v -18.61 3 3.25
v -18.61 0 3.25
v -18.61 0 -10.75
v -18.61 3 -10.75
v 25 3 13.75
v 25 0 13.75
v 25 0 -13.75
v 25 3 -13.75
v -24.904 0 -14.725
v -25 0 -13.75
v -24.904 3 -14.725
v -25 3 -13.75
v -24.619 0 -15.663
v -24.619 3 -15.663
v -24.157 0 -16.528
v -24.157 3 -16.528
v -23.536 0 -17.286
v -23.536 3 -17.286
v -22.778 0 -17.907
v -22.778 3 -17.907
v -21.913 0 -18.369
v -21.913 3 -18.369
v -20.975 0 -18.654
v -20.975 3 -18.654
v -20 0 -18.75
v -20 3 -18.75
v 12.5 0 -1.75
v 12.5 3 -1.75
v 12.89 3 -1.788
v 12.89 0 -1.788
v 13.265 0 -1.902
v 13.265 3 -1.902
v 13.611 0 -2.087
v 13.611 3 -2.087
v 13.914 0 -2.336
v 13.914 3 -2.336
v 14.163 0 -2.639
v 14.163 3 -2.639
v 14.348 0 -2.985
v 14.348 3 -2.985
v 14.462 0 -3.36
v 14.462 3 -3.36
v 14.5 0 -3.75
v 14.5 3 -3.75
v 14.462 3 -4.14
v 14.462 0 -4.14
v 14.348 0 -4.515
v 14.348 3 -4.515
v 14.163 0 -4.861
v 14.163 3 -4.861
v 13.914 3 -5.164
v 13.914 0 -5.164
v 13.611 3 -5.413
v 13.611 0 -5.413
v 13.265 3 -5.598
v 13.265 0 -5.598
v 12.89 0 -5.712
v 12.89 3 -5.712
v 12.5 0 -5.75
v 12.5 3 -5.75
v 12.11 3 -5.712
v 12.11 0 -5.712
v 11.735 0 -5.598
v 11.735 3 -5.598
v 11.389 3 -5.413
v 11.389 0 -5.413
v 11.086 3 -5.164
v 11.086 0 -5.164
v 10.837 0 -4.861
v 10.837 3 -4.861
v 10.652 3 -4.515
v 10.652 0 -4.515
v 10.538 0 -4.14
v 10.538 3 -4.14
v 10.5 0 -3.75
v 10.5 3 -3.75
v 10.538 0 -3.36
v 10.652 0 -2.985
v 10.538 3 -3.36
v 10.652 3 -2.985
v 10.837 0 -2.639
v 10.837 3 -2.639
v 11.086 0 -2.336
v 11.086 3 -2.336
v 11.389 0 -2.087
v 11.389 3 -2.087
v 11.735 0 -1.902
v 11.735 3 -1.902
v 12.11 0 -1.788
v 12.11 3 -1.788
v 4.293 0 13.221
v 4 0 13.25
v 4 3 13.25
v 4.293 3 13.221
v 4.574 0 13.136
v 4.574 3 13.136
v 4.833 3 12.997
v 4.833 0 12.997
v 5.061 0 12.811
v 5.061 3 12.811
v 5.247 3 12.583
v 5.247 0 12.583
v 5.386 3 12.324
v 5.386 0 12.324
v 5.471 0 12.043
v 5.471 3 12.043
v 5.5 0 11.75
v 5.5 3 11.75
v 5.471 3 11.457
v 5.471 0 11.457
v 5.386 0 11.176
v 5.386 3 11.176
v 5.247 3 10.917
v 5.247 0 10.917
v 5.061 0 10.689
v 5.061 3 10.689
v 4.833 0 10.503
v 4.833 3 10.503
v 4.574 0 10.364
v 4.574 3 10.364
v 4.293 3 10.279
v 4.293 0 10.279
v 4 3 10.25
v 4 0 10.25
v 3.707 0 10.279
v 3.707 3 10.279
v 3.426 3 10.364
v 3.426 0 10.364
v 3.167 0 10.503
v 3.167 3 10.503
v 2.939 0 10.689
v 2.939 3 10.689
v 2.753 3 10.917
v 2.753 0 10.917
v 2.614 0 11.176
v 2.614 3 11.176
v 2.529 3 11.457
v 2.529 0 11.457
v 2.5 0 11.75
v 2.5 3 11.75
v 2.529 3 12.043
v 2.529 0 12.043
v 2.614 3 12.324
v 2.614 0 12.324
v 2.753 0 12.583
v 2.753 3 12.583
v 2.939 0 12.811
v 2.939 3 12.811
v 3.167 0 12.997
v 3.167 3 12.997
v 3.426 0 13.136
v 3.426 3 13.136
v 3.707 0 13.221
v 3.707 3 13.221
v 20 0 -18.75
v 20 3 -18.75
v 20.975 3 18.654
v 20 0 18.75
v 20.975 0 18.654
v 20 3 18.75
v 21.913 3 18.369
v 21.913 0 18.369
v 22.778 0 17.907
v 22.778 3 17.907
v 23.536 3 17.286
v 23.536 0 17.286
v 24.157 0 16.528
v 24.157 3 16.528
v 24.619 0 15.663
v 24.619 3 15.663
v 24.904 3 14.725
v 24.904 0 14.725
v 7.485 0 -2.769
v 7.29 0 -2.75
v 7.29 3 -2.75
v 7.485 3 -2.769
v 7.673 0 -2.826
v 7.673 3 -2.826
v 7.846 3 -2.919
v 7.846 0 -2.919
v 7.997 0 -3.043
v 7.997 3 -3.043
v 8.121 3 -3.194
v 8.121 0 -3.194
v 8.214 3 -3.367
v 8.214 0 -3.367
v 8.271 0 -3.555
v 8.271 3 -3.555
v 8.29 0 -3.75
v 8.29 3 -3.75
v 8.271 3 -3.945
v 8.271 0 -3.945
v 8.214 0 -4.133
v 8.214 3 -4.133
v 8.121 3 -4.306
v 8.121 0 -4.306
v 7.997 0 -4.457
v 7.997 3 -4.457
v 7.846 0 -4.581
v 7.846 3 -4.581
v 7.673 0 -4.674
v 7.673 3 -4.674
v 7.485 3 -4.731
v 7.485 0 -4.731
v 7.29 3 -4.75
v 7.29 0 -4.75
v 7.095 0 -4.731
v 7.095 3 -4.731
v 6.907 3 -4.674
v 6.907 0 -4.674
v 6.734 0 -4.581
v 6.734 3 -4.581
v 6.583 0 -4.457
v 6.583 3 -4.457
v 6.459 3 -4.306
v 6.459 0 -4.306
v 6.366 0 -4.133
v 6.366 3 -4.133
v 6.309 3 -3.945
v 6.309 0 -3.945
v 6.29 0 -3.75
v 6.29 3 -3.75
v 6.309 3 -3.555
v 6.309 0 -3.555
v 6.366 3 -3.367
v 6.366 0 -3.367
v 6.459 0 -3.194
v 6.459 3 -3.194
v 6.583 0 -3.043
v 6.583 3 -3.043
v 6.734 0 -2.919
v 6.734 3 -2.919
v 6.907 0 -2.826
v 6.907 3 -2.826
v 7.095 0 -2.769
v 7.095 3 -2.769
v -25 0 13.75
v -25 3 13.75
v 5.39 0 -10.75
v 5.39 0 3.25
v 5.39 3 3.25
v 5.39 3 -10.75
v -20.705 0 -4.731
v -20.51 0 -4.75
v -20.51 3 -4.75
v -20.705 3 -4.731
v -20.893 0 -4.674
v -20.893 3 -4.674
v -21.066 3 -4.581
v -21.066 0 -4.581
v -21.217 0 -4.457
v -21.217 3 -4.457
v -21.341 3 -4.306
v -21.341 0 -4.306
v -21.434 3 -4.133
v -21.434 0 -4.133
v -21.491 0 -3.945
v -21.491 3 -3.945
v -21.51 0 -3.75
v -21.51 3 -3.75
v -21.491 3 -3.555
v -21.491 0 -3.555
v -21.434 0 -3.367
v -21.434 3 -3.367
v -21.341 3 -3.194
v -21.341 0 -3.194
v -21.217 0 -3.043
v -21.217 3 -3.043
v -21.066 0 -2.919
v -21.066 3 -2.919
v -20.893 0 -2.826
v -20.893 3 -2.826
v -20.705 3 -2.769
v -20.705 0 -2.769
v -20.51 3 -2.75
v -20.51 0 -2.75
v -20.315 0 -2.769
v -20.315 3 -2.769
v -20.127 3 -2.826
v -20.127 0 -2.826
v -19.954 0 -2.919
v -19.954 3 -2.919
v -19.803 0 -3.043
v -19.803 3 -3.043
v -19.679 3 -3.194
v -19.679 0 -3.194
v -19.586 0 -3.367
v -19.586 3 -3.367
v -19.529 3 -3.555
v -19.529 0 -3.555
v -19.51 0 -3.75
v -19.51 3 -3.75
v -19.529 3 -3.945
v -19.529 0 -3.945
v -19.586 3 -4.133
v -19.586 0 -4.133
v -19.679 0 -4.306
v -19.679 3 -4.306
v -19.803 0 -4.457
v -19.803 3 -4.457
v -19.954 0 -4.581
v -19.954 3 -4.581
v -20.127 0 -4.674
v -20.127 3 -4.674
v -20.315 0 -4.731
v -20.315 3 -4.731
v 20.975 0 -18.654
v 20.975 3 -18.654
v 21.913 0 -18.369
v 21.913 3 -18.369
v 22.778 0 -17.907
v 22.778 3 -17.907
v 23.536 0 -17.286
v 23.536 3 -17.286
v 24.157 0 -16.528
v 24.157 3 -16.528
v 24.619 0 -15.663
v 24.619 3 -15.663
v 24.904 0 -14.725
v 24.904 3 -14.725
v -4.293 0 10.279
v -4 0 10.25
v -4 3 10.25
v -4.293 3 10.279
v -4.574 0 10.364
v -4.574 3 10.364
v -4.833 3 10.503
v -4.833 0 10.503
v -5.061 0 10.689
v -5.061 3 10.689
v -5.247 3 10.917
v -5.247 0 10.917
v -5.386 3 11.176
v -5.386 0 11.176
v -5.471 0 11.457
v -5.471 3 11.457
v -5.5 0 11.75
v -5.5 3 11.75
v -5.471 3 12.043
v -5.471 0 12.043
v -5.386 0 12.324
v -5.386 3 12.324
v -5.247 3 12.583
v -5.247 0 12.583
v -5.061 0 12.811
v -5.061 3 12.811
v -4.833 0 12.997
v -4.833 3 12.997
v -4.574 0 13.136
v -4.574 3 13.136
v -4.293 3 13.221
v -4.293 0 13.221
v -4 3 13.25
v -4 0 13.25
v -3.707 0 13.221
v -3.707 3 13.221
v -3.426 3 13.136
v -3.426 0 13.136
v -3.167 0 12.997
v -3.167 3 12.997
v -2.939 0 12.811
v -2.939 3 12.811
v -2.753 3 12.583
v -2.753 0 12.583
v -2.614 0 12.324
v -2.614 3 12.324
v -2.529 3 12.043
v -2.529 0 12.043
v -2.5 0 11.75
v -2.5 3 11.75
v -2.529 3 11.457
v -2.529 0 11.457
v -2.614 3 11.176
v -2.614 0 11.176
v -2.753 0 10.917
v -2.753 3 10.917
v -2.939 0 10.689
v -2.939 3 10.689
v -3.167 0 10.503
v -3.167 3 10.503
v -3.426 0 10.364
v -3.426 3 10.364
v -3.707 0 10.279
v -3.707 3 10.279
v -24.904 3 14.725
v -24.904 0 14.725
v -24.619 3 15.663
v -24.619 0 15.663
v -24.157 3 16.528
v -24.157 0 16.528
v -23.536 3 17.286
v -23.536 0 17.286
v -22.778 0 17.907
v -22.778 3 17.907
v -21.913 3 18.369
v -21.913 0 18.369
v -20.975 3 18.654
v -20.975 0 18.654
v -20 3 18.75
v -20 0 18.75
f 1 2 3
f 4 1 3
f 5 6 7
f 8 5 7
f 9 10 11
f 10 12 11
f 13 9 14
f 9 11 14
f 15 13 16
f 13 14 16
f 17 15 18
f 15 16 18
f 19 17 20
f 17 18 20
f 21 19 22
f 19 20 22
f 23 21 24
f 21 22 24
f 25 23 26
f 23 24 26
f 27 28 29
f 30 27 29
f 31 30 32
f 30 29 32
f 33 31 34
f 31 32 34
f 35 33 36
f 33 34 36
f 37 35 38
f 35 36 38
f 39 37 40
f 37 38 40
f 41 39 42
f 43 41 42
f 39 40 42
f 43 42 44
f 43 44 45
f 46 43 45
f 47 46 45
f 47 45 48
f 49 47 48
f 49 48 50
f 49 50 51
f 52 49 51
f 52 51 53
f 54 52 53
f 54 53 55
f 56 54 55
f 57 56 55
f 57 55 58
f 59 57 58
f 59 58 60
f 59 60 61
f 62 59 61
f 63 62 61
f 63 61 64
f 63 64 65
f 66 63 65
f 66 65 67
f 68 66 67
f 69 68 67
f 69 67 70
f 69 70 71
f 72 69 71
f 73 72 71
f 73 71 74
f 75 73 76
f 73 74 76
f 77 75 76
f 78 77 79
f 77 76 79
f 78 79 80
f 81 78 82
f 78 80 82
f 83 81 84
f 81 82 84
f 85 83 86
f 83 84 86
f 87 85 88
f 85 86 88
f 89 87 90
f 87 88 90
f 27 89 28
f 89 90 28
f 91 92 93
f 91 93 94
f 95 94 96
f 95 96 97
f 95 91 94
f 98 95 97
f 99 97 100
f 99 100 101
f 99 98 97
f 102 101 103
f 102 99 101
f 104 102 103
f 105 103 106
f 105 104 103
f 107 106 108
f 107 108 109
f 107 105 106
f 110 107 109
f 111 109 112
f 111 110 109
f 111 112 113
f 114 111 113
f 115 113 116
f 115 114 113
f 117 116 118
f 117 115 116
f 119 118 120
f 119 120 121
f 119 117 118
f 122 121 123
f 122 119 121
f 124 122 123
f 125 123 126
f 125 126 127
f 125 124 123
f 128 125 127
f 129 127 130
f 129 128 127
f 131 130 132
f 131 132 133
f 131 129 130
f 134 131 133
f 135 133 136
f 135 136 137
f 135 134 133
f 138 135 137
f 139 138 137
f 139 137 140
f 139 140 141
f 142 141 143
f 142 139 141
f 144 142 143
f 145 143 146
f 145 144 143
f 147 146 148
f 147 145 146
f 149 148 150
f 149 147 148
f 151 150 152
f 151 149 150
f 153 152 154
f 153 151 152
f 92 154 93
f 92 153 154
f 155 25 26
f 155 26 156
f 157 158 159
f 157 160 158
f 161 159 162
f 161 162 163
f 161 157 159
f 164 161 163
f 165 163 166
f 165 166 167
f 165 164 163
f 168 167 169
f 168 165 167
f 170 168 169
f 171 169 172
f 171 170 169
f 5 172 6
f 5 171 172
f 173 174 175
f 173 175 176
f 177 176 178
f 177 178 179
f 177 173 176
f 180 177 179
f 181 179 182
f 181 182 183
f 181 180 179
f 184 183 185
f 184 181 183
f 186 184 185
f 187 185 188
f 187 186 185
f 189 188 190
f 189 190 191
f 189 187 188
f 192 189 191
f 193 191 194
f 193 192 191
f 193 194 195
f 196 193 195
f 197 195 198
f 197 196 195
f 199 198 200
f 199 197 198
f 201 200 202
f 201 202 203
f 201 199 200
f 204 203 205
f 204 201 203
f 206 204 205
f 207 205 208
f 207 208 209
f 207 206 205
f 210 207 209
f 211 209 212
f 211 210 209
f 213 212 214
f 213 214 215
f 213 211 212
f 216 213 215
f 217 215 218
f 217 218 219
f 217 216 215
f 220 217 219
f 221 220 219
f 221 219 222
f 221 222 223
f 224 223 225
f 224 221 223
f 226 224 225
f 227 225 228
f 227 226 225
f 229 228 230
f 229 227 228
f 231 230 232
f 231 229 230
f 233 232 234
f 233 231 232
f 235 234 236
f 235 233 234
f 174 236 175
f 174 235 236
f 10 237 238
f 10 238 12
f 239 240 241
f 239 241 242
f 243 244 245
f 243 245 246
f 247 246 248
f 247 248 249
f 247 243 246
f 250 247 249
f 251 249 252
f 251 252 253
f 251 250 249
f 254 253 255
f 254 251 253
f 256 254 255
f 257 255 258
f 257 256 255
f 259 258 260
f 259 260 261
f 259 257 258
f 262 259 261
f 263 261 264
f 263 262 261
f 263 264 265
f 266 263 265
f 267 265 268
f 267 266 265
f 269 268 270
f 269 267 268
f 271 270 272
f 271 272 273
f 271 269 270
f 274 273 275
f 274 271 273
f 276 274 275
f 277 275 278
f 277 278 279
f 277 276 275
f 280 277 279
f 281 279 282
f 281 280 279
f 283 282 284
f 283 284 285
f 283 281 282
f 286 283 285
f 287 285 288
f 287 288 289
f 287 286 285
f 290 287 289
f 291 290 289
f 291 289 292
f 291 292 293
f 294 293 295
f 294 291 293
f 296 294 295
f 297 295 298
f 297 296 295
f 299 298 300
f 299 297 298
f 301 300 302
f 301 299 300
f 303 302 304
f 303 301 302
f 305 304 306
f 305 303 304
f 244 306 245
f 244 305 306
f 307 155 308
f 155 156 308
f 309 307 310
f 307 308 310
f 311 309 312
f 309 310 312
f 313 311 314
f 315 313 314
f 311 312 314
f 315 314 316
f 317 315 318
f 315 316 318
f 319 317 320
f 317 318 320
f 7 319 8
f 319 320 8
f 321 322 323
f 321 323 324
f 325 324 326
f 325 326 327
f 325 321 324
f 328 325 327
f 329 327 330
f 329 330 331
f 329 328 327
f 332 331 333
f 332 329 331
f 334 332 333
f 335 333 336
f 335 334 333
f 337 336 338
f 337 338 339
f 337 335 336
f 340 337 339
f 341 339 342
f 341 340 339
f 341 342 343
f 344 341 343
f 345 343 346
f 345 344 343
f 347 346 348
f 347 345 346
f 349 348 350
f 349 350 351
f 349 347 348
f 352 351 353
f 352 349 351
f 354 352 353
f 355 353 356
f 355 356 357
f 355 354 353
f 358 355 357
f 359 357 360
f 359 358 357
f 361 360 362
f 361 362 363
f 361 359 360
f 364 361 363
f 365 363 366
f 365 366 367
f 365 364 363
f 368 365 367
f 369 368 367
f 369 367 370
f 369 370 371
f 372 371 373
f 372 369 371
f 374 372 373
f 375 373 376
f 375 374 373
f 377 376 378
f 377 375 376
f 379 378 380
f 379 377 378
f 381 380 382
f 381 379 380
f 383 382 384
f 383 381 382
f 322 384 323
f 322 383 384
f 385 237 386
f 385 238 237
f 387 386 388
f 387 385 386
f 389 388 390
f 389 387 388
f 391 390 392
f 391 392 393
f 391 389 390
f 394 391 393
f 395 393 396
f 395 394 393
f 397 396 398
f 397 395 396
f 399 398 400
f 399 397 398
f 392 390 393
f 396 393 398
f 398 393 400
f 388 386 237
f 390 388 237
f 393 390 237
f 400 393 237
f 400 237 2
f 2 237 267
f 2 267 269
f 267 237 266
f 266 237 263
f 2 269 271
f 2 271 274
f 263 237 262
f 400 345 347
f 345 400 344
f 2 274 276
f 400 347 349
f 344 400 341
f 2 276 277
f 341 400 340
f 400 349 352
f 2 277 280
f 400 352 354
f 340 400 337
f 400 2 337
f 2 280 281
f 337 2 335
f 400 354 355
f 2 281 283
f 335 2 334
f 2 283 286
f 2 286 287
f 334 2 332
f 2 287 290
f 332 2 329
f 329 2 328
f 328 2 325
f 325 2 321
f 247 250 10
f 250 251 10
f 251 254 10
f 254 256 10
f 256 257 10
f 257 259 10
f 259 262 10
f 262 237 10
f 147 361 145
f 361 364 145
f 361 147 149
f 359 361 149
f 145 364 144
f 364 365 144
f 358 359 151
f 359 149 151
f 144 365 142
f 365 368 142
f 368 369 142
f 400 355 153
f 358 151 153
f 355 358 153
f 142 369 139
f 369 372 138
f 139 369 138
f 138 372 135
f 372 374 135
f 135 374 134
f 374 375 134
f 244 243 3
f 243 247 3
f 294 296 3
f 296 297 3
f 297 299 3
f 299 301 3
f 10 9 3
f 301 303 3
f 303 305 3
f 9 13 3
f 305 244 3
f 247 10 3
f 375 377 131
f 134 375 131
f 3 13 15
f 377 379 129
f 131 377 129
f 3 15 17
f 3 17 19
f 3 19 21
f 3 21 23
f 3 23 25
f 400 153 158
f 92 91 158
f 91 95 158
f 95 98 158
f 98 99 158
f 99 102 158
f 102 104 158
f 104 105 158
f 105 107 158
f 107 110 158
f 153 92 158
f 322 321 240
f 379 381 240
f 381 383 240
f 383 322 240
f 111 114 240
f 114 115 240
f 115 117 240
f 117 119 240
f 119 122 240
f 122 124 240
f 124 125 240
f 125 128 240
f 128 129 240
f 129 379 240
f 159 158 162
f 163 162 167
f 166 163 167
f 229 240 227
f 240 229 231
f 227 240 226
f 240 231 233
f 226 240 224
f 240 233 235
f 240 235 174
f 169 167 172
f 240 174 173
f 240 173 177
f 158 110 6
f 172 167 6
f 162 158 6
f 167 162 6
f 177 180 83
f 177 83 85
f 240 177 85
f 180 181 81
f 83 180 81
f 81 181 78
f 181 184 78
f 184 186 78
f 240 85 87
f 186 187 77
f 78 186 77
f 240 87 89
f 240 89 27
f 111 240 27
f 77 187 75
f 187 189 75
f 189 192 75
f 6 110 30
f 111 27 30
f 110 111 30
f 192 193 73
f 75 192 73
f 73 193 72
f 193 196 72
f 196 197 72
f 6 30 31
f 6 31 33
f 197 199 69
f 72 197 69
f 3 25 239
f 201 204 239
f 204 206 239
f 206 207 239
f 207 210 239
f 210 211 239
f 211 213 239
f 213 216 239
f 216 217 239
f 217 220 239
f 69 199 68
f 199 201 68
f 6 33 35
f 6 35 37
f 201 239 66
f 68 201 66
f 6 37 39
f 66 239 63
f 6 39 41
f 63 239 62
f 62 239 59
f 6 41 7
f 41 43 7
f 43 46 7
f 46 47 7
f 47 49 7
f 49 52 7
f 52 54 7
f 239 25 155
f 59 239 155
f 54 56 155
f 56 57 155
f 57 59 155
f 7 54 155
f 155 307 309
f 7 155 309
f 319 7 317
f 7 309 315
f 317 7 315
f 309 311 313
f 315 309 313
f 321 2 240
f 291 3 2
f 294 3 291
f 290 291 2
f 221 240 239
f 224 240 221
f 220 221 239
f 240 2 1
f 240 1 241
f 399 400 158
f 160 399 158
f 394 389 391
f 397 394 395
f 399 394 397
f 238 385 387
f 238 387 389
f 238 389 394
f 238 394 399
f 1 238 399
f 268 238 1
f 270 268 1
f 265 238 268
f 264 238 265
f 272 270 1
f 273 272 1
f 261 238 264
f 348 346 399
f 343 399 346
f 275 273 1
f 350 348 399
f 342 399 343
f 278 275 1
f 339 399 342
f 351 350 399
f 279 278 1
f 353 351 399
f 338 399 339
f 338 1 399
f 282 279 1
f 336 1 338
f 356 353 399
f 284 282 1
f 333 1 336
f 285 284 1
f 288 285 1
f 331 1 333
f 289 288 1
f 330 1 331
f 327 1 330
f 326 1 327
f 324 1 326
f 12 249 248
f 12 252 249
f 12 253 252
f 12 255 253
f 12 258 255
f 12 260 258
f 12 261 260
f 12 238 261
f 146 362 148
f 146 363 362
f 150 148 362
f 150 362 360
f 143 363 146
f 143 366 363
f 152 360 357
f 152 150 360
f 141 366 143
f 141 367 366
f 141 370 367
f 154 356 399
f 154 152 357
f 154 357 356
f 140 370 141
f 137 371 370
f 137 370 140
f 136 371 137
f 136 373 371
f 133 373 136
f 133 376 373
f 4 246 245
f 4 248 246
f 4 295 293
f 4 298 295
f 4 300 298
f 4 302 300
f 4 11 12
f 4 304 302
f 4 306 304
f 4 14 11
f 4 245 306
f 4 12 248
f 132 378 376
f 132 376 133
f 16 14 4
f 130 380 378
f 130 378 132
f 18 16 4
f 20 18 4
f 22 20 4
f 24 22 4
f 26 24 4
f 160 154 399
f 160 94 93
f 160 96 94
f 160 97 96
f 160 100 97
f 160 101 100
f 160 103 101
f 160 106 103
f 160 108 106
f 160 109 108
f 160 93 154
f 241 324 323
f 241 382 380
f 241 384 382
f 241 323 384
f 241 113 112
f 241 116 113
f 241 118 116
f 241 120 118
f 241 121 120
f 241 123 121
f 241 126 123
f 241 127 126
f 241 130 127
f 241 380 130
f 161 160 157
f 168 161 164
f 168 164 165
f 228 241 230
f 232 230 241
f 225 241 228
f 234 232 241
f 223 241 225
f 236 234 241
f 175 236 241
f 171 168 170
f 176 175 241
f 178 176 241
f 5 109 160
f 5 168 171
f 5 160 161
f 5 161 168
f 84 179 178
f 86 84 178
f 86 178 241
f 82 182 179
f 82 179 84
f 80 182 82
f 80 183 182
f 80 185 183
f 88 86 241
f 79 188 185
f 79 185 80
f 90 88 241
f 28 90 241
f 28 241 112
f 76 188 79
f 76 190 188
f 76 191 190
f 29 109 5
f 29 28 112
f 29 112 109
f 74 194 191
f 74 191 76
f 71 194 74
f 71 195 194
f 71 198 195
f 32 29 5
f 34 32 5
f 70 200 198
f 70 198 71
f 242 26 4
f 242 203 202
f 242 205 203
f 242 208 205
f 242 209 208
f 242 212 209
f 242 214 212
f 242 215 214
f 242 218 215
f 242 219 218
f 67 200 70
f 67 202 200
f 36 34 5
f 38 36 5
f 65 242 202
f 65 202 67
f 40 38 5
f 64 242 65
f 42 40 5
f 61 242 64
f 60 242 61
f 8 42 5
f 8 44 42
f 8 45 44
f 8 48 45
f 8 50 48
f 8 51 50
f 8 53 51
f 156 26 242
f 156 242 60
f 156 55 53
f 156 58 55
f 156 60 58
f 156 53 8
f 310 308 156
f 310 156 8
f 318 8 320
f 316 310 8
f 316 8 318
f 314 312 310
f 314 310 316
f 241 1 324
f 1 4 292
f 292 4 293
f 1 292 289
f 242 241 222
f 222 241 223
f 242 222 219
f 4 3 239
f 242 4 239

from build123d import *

# Parameters (mm, degrees)
SKETCH_1_W          = 50
SKETCH_1_H          = 37.5
SKETCH_1_R          = 1.5
SKETCH_1_R_2        = 1
SKETCH_1_W_2        = 24
SKETCH_1_H_2        = 14
EXTRUDE_1_DEPTH     = 3
FILLET_1_R          = 5
SKETCH_2_R          = 2
CUT_EXTRUDE_1_DEPTH = 10


with BuildPart() as part:
    # 草图1 → 凸台-拉伸1 (new body)
    with BuildSketch(Plane(origin=(0, 0, 0), x_dir=(1, 0, 0), z_dir=(0, 1, 0))):
        Rectangle(SKETCH_1_W, SKETCH_1_H)
        with Locations(Location((4, -11.75, 0), (0, 0, 270))):
            Circle(SKETCH_1_R, mode=Mode.SUBTRACT)
        with Locations(Location((-4, -11.75, 0), (0, 0, 90))):
            Circle(SKETCH_1_R, mode=Mode.SUBTRACT)
        with Locations(Location((7.29, 3.75, 0), (0, 0, 270))):
            Circle(SKETCH_1_R_2, mode=Mode.SUBTRACT)
        with Locations(Location((-20.51, 3.75, 0), (0, 0, 90))):
            Circle(SKETCH_1_R_2, mode=Mode.SUBTRACT)
        with Locations((-6.61, 3.75)):
            Rectangle(SKETCH_1_W_2, SKETCH_1_H_2, mode=Mode.SUBTRACT)
    extrude(amount=EXTRUDE_1_DEPTH)

    # 圆角1
    fillet_1_edges = [part.edges().sort_by_distance(p)[0] for p in [
        (25, 1.5, 18.75),
        (-25, 1.5, 18.75),
        (-25, 1.5, -18.75),
        (25, 1.5, -18.75),
    ]]
    fillet(fillet_1_edges, radius=FILLET_1_R)

    # 草图2 → 切除-拉伸1 (cut)
    with BuildSketch(Plane(origin=(0, 3, 0), x_dir=(1, 0, 0), z_dir=(0, 1, 0))):
        with Locations(Location((12.5, 3.75, 0), (0, 0, 270))):
            Circle(SKETCH_2_R)
    extrude(amount=-CUT_EXTRUDE_1_DEPTH, mode=Mode.SUBTRACT)


solid = part.part
